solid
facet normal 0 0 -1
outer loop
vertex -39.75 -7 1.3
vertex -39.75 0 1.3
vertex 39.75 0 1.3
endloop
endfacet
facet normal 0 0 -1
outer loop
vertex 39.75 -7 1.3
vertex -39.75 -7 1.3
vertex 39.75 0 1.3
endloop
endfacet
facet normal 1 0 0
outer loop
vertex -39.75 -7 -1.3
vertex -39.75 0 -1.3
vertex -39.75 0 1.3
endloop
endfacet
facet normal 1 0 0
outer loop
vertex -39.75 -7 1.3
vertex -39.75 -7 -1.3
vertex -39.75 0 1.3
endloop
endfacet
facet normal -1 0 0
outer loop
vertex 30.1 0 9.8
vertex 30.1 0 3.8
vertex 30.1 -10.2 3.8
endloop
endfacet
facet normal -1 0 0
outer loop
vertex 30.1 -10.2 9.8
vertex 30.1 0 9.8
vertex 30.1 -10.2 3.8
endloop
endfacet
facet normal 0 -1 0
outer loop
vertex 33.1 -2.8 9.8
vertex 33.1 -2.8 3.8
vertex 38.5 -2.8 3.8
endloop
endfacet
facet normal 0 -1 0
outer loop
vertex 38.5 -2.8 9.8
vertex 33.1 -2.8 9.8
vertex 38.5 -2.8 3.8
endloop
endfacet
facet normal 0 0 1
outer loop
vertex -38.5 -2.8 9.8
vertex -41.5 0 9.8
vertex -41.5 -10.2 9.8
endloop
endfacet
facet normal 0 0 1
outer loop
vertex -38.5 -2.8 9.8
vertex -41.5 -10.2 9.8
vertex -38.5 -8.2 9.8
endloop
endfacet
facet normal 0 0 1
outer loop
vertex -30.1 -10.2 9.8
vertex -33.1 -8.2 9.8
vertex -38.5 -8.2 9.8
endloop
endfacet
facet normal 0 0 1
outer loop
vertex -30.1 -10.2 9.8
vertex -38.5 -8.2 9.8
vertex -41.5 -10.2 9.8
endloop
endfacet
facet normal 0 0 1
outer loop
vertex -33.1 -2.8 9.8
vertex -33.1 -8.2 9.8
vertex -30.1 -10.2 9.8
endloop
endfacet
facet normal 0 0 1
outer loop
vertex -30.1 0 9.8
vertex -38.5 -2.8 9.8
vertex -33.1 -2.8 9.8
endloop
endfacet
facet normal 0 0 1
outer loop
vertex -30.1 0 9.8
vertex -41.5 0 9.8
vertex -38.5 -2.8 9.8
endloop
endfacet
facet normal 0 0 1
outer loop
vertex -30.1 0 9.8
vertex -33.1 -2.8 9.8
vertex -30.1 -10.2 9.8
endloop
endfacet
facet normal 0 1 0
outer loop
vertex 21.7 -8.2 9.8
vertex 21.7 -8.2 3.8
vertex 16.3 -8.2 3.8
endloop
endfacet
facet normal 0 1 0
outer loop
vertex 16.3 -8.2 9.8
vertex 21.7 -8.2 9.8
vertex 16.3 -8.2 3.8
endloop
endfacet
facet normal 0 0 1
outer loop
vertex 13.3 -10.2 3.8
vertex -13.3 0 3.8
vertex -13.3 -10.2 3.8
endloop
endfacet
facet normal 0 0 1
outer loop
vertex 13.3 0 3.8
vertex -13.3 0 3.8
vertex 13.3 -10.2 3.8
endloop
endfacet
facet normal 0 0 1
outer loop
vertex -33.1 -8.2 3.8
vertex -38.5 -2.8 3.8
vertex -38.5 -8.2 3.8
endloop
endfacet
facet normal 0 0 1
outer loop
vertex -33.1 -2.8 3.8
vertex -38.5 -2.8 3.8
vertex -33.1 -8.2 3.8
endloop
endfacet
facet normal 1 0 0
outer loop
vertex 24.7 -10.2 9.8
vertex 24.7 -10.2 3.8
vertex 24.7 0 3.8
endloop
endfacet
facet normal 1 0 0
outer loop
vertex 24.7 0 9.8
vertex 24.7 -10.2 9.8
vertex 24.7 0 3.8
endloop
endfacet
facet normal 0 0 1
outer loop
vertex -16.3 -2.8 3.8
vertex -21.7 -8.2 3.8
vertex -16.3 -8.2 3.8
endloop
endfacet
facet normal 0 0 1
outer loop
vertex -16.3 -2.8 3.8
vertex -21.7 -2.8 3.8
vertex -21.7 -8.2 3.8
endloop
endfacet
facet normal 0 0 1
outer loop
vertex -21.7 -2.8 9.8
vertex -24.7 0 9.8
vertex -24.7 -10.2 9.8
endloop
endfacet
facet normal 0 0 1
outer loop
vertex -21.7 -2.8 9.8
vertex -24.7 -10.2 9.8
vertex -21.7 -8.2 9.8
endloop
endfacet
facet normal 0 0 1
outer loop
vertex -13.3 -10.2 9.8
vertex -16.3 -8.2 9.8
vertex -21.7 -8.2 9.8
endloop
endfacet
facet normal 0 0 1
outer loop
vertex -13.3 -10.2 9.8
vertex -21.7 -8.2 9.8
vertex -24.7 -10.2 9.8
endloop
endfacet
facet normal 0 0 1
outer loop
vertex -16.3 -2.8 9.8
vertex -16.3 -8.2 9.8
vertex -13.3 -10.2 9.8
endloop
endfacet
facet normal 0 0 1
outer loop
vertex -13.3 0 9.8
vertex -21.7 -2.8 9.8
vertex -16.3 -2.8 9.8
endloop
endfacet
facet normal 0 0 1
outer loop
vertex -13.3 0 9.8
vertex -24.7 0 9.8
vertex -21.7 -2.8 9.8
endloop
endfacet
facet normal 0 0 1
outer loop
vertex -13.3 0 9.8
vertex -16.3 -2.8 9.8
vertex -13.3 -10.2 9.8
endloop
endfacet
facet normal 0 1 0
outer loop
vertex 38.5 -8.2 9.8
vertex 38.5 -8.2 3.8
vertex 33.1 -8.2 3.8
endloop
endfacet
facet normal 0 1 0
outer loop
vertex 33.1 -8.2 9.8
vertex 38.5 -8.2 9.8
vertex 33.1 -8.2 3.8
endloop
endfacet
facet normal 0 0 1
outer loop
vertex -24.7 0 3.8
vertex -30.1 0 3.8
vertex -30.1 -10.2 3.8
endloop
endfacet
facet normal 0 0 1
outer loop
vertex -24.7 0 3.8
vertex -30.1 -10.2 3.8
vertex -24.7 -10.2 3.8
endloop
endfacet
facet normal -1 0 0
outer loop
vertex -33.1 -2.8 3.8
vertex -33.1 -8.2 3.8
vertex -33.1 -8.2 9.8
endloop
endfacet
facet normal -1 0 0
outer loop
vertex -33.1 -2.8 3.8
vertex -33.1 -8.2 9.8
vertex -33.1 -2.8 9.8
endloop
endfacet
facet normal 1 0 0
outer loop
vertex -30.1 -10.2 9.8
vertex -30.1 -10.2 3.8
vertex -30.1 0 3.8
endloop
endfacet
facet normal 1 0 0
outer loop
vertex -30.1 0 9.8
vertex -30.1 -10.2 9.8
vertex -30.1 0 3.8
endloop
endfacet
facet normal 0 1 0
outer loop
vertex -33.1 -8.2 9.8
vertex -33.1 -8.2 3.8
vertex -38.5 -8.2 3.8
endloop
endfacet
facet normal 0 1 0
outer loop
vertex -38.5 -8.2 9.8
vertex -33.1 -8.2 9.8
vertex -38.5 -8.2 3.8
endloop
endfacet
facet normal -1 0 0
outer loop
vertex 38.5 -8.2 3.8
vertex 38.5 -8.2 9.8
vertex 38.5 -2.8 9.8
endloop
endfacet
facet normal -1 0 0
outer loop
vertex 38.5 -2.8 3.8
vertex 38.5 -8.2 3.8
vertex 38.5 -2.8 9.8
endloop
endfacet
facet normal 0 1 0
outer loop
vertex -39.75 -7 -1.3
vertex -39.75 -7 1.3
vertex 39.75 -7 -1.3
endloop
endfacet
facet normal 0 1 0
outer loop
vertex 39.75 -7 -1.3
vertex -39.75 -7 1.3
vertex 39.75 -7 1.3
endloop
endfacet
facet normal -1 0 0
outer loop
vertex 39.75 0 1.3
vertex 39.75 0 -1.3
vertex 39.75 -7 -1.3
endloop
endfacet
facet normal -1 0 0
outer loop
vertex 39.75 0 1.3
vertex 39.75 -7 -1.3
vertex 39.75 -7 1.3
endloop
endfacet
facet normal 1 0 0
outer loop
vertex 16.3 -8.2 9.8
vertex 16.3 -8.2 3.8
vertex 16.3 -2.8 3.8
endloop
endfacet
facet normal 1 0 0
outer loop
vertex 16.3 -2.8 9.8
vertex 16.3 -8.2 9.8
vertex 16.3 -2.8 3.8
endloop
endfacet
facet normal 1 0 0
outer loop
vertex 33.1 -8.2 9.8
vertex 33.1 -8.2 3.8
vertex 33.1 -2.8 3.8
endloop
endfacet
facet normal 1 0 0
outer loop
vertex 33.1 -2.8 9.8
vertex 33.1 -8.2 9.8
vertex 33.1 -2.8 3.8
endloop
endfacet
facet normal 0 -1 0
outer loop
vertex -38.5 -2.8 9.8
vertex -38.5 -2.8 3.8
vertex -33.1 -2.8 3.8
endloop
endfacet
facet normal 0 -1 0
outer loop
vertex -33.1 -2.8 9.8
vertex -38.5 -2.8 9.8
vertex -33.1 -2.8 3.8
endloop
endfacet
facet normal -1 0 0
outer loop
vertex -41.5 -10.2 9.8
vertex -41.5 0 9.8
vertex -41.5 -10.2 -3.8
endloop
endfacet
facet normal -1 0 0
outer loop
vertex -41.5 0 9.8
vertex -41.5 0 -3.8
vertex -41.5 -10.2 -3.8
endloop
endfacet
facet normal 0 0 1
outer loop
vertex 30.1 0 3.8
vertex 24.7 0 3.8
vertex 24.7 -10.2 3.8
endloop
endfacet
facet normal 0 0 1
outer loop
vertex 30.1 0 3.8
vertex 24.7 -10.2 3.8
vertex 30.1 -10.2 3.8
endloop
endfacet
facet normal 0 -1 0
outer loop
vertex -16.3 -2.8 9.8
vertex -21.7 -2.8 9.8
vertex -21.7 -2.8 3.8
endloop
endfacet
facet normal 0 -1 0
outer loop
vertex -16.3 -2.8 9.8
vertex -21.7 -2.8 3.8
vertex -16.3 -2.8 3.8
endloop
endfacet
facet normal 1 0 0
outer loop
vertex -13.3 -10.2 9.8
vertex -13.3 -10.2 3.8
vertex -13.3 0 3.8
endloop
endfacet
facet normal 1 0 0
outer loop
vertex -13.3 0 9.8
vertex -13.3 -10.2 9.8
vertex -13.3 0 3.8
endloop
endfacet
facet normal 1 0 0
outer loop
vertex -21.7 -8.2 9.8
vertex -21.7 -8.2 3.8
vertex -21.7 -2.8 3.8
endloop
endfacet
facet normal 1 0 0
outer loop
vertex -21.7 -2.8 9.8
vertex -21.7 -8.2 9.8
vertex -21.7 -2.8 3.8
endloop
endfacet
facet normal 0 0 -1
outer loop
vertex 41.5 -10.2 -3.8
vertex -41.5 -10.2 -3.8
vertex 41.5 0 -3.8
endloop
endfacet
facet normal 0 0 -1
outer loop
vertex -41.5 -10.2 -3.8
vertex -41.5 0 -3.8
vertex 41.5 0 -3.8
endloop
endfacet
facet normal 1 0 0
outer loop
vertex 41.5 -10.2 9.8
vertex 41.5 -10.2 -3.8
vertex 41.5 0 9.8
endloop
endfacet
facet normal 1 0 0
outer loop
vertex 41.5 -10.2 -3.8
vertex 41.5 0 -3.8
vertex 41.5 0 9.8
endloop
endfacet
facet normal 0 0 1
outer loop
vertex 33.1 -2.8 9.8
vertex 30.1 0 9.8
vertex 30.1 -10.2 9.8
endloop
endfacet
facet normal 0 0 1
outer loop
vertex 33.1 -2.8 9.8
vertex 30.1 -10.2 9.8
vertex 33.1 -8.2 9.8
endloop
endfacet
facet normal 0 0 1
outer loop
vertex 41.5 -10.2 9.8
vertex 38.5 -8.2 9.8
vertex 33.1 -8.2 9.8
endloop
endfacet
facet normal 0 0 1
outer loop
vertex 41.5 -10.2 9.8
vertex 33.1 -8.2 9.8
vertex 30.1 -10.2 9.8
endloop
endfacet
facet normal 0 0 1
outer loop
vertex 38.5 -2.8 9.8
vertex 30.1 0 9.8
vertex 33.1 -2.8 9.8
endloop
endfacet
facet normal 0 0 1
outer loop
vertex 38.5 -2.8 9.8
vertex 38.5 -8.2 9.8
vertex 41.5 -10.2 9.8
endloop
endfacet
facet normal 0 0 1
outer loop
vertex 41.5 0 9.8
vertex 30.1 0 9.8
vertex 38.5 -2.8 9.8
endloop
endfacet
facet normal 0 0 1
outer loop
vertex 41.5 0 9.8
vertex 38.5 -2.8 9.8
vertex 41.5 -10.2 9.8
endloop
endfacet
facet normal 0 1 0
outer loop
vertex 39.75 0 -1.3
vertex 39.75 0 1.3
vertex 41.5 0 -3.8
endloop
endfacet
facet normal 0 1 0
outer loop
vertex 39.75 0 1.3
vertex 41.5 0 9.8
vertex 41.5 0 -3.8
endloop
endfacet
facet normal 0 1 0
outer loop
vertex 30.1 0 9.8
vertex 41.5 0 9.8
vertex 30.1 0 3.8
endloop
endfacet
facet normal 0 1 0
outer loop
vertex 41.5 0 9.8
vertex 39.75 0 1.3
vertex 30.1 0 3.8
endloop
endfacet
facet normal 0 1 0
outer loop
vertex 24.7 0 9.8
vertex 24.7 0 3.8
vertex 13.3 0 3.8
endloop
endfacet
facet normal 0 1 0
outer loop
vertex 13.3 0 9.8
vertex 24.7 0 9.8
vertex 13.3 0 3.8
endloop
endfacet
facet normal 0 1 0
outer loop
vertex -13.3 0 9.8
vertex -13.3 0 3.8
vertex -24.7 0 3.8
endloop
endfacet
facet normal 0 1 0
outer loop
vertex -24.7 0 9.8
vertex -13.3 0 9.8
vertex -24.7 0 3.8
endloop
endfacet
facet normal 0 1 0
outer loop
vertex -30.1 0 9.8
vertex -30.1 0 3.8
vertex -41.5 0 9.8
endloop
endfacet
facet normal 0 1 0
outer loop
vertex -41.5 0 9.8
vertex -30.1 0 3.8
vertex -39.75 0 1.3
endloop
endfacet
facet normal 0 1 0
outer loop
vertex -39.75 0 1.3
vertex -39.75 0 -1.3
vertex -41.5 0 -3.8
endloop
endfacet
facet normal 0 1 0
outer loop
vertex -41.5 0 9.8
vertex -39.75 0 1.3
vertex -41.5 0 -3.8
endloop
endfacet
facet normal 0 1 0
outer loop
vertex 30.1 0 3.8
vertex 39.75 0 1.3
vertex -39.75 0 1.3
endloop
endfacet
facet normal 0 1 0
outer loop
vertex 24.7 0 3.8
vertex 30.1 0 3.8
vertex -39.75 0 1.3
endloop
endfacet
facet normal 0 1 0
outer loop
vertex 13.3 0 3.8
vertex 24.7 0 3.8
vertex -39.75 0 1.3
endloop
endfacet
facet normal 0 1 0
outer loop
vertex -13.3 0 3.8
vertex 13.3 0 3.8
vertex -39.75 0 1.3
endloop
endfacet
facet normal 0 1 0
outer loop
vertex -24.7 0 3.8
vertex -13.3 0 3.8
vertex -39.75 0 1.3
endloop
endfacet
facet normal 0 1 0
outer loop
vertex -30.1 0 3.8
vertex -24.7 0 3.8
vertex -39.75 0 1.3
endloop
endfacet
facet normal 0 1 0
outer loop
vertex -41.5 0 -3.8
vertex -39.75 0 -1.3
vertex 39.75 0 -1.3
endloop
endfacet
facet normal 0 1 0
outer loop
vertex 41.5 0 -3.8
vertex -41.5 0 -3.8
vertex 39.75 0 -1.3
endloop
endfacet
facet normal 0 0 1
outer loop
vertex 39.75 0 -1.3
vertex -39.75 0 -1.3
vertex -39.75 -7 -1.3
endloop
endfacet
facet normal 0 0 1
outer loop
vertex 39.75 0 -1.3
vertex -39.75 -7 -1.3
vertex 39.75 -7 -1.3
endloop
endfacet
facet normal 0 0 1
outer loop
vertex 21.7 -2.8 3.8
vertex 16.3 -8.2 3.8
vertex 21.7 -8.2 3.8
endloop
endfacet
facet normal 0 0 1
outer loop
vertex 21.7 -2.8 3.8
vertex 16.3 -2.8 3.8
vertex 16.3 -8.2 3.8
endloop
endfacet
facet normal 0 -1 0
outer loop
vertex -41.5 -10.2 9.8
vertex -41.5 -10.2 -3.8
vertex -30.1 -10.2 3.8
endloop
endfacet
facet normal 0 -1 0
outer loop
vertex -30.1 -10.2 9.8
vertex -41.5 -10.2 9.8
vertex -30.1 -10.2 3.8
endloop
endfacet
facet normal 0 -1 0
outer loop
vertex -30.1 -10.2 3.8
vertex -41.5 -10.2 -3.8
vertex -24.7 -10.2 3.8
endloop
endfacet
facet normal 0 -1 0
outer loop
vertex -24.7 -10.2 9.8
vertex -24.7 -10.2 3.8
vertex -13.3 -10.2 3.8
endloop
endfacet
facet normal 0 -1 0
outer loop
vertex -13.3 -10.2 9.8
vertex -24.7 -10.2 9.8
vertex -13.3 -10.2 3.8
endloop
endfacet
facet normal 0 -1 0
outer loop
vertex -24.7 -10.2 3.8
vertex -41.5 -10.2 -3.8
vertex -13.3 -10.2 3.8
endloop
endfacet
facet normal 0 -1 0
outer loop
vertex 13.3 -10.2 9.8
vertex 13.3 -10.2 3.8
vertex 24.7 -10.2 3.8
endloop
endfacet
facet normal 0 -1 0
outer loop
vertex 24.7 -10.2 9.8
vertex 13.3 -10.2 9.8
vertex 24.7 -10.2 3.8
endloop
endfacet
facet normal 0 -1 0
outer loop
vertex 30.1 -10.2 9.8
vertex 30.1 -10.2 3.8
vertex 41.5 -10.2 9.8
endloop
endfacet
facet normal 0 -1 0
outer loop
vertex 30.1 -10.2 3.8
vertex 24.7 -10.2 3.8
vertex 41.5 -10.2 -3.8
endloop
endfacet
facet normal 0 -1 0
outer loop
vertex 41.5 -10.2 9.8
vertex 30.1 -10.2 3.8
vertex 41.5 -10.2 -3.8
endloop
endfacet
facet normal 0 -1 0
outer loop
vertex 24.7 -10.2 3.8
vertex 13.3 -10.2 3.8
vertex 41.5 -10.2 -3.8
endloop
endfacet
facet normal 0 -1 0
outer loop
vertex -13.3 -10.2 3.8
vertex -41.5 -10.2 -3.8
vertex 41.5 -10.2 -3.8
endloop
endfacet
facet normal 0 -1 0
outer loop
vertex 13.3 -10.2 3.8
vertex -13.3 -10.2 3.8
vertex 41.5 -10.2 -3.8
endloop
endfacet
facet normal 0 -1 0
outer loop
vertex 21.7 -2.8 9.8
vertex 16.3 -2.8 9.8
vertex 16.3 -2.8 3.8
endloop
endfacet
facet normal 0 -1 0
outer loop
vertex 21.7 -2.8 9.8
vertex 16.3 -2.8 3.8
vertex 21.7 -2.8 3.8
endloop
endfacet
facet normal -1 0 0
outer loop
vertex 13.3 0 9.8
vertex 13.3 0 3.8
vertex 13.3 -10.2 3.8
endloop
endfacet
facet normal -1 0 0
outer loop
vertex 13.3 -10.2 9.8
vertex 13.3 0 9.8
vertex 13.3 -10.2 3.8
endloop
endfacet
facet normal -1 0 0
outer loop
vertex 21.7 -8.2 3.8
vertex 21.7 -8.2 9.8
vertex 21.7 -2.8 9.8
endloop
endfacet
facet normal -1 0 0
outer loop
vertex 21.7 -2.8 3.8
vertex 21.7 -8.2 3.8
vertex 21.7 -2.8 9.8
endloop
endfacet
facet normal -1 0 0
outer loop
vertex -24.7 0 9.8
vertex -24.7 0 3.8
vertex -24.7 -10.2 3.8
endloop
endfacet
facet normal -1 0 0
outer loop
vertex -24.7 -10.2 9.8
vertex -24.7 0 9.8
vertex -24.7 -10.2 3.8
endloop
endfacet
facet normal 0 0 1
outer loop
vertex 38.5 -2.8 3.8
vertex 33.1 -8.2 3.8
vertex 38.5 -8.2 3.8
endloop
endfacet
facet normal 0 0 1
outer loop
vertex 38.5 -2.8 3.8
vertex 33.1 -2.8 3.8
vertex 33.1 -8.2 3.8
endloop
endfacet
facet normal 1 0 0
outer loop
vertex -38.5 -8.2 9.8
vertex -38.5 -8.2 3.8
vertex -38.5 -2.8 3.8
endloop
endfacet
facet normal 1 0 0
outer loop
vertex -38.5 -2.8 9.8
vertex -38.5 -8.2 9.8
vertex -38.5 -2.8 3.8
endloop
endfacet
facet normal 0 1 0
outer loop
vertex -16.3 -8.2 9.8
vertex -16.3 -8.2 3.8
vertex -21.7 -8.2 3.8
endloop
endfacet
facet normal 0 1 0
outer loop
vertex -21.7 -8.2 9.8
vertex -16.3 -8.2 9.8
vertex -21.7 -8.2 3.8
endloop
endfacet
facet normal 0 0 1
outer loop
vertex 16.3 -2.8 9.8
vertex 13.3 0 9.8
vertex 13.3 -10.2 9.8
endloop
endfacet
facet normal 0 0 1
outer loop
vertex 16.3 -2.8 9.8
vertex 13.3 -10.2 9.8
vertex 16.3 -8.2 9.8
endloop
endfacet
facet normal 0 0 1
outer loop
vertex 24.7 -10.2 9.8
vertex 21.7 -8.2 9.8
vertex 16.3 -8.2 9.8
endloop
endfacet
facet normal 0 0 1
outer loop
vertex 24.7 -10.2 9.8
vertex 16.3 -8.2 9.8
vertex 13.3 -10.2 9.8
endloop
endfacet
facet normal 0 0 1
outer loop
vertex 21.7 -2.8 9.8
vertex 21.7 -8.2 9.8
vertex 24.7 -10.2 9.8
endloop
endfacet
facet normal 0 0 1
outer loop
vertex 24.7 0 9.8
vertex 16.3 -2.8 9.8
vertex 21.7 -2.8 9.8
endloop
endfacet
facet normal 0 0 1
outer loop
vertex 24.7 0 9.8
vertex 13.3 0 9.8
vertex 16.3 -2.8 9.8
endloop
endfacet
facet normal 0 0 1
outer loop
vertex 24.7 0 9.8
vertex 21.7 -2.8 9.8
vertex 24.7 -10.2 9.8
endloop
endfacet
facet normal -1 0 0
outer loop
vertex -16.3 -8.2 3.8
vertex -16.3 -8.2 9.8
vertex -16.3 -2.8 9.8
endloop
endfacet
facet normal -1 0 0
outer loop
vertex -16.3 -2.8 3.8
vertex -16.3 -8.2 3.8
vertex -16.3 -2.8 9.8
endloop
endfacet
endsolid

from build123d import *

# Parameters (mm, degrees)
F0_W     = 83
F0_H     = 7.6
F0_W_2   = 79.5
F0_H_2   = 2.6
F1_DEPTH = 7
F2_W     = 83
F2_H     = 7.6
F2_W_2   = 79.5
F2_H_2   = 2.6
F3_DEPTH = 3.2
F4_W     = 3
F4_H     = 2
F4_W_2   = 5.4
F4_H_2   = 5.4
F4_H_3   = 2.8
F5_DEPTH = 6


with BuildPart() as f1:
    # F0 (on Front) → F1 (new body)
    with BuildSketch(Plane.XZ):
        Rectangle(F0_W, F0_H)
        Rectangle(F0_W_2, F0_H_2, mode=Mode.SUBTRACT)
    extrude(amount=F1_DEPTH)

    # F2 (on face) → F3 (join)
    with BuildSketch(Plane.XZ.offset(7)):
        Rectangle(F2_W, F2_H)
        Rectangle(F2_W_2, F2_H_2, mode=Mode.SUBTRACT)
        Rectangle(F2_W_2, F2_H_2)
    extrude(amount=F3_DEPTH)

    # F4 (on face) → F5 (join)
    with BuildSketch(Plane.XY.offset(3.8)):
        with Locations((-40, -9.2)):
            Rectangle(F4_W, F4_H)
        with Locations((-35.8, -9.2)):
            Rectangle(F4_W_2, F4_H)
        with Locations((-40, -5.5)):
            Rectangle(F4_W, F4_H_2)
        with Locations((-31.6, -9.2)):
            Rectangle(F4_W, F4_H)
        with Locations((-40, -1.4)):
            Rectangle(F4_W, F4_H_3)
        with Locations((-31.6, -5.5)):
            Rectangle(F4_W, F4_H_2)
        with Locations((-35.8, -1.4)):
            Rectangle(F4_W_2, F4_H_3)
        with Locations((-23.2, -9.2)):
            Rectangle(F4_W, F4_H)
        with Locations((-31.6, -1.4)):
            Rectangle(F4_W, F4_H_3)
        with Locations((-19, -9.2)):
            Rectangle(F4_W_2, F4_H)
        with Locations((-23.2, -5.5)):
            Rectangle(F4_W, F4_H_2)
        with Locations((-14.8, -9.2)):
            Rectangle(F4_W, F4_H)
        with Locations((-23.2, -1.4)):
            Rectangle(F4_W, F4_H_3)
        with Locations((-14.8, -5.5)):
            Rectangle(F4_W, F4_H_2)
        with Locations((-19, -1.4)):
            Rectangle(F4_W_2, F4_H_3)
        with Locations((-14.8, -1.4)):
            Rectangle(F4_W, F4_H_3)
        with Locations((14.8, -9.2)):
            Rectangle(F4_W, F4_H)
        with Locations((19, -9.2)):
            Rectangle(F4_W_2, F4_H)
        with Locations((14.8, -5.5)):
            Rectangle(F4_W, F4_H_2)
        with Locations((23.2, -9.2)):
            Rectangle(F4_W, F4_H)
        with Locations((14.8, -1.4)):
            Rectangle(F4_W, F4_H_3)
        with Locations((23.2, -5.5)):
            Rectangle(F4_W, F4_H_2)
        with Locations((19, -1.4)):
            Rectangle(F4_W_2, F4_H_3)
        with Locations((31.6, -9.2)):
            Rectangle(F4_W, F4_H)
        with Locations((23.2, -1.4)):
            Rectangle(F4_W, F4_H_3)
        with Locations((35.8, -9.2)):
            Rectangle(F4_W_2, F4_H)
        with Locations((31.6, -5.5)):
            Rectangle(F4_W, F4_H_2)
        with Locations((40, -9.2)):
            Rectangle(F4_W, F4_H)
        with Locations((31.6, -1.4)):
            Rectangle(F4_W, F4_H_3)
        with Locations((40, -5.5)):
            Rectangle(F4_W, F4_H_2)
        with Locations((35.8, -1.4)):
            Rectangle(F4_W_2, F4_H_3)
        with Locations((40, -1.4)):
            Rectangle(F4_W, F4_H_3)
    extrude(amount=F5_DEPTH)


solid = f1.part
